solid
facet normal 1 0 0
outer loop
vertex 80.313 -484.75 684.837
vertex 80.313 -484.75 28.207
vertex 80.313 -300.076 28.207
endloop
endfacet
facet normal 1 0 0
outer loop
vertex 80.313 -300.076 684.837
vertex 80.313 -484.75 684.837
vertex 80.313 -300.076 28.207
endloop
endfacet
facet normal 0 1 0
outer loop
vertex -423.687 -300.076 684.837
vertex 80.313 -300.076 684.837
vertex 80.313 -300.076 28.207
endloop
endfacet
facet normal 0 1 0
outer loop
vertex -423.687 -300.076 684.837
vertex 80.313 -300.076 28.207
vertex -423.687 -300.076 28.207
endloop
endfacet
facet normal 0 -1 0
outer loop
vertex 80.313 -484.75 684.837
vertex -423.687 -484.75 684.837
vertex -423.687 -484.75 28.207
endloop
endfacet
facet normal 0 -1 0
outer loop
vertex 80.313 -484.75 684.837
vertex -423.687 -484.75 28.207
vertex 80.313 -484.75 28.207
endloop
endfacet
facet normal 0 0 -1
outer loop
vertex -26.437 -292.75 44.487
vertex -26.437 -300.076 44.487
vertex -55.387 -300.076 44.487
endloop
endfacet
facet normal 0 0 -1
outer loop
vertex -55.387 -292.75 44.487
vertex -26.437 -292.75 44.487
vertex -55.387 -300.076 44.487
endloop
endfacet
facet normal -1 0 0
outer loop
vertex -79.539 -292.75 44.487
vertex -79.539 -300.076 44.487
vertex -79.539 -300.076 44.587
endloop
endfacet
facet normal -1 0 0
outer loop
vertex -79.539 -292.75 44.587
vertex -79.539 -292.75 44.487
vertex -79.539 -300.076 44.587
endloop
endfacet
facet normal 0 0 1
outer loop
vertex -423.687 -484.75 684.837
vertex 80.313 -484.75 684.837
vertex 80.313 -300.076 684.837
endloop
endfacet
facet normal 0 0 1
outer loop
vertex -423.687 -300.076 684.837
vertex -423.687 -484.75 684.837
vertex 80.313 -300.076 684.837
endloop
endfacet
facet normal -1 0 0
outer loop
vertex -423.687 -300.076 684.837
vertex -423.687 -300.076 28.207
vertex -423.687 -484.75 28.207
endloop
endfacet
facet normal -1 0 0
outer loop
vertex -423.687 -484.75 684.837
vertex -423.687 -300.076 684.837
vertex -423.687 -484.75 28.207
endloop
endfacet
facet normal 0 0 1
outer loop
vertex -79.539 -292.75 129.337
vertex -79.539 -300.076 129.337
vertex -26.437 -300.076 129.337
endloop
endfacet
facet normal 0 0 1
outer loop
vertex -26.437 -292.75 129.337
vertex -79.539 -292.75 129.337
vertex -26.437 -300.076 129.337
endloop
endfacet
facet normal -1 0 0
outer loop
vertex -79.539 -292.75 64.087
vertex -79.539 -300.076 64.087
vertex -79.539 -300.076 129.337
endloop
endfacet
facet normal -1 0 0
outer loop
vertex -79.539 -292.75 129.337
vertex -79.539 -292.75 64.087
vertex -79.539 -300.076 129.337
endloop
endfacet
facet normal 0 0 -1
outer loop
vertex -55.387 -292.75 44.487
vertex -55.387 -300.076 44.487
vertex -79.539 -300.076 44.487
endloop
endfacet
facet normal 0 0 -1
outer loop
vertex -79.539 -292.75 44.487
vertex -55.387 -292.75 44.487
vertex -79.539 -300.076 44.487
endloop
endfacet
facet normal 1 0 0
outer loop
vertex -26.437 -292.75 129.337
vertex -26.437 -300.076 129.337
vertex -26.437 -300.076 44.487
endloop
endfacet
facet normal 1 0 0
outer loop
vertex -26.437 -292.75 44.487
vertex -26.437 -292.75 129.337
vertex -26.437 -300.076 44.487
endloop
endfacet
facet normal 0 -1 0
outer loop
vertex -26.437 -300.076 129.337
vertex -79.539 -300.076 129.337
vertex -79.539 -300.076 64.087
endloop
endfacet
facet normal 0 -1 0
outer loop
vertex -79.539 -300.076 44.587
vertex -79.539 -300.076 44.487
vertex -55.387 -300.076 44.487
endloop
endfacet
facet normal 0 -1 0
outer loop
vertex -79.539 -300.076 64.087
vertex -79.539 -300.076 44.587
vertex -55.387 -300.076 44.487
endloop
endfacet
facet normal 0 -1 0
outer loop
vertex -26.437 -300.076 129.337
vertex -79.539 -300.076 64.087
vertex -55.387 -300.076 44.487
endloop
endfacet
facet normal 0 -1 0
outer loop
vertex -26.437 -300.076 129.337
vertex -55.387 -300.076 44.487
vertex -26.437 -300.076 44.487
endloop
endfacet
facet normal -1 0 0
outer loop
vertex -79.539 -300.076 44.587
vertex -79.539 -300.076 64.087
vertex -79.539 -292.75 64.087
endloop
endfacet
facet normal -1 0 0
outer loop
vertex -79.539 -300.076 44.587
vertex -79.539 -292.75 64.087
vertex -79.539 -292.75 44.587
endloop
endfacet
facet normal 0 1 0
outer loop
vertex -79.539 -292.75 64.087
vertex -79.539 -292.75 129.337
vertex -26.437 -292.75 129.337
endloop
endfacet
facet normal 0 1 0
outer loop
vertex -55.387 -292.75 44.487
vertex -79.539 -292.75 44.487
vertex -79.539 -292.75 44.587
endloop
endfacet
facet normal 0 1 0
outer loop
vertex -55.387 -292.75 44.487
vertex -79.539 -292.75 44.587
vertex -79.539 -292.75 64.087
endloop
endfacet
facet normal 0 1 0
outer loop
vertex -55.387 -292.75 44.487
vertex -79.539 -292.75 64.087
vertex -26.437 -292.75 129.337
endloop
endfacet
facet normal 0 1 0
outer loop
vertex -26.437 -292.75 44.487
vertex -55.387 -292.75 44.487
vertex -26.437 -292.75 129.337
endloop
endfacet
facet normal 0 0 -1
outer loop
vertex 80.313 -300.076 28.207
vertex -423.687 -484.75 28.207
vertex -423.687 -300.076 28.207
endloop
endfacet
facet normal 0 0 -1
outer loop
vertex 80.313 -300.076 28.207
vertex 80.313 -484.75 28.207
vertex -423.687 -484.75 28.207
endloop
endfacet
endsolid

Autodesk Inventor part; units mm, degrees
ref_plane "Work Plane1" through (-416.1869, -470.7505, 28.2071) normal (0, 0, -1) x (0, 1, 0)
sketch "Sketch1" plane through (-416.1869, -470.7505, 28.2071) normal (0, 0, -1) x (0, 1, 0)
  line L0 (-5.675, 491.5) -> (-5.675, 423.5) construction
  line L1 (170.675, 423.5) -> (170.675, 491.5) construction
  line L2 (166, -7.5) -> (160.638, -7.5) construction
  line L3 (154.362, -7.5) -> (149, -7.5) construction
  line L4 (16, -7.5) -> (10.638, -7.5) construction
  line L5 (4.362, -7.5) -> (-1, -7.5) construction
  line L6 (94.0505, 496.5) -> (100.0959, 496.5) construction
  line L7 (101.0959, 496.5) -> (107.1414, 496.5) construction
  line L8 (108.1414, 496.5) -> (114.1868, 496.5) construction
  line L9 (-13.9999, 496.5) -> (170.675, 496.5)
  line L10 (170.675, 496.5) -> (170.675, -7.5)
  line L11 (170.675, -7.5) -> (-13.9999, -7.5)
  line L12 (-13.9999, -7.5) -> (-13.9999, 496.5)
  line L13 (-13.69, 71.5) -> (-13.69, 253.5) construction
  line L14 (-13.9999, 266.9308) -> (-13.9999, 290.6308) construction
  point P0 (470.7505, 416.1869)
ref_plane "Work Plane2" through (60.3131, -476.4255, 684.8371) normal (0, 0, 1) x (1, 0, 0)
extrude "Extrusion1" add sketch "Sketch1" against normal up to surface (656.63 mm away)
sketch "Sketch2" plane through (-423.6869, -300.0755, 28.2071) normal (0, 1, 0) x (1, 0, 0)
  line L0 (397.25, -16.28) -> (344.1479, -16.28)
  line L1 (344.1479, -16.28) -> (344.1479, -101.13)
  line L2 (344.1479, -101.13) -> (397.25, -101.13)
  line L3 (397.25, -101.13) -> (397.25, -16.28)
  line L4 (344.1479, -35.88) -> (344.1479, -16.38) projected
  arc A0 (397.2117, -88.1724) -> (397.052, -86.959) centre (385.25, -89.13) ccw projected
  line L5 (343.1, -16.28) -> (368.3, -16.28) projected
  point P0 (423.6869, 28.2071)
ref_plane "Work Plane3" through (-49.4369, -292.7505, 106.3371) normal (0, 1, 0) x (0, 0, 1)
extrude "Extrusion2" add sketch "Sketch2" along normal up to surface (7.325 mm away) separate body
ref_plane "Work Plane4" through (50.3442, -329.0906, 827.6498) normal (0, 0, 1) x (1, 0, 0)
sketch "Sketch4" plane through (-423.6869, -484.7505, 684.8371) normal (0, 0, 1) x (1, 0, 0)
  line L0 (484, 161.1598) -> (484, 161.1598) projected
  line L1 (484, 153.6598) -> (484, 153.6598) projected
  line L2 (504, 157.4099) -> (478, 157.4099)
  line L3 (504, 184.6749) -> (504, 157.4099)
  line L4 (504, 0) -> (0, 0) construction
  line L5 (504, 184.6749) -> (504, 0) construction
  line L6 (0, 184.6749) -> (504, 184.6749) construction
  line L7 (0, 0) -> (0, 184.6749) construction
  line L8 (478, 157.4099) -> (453, 157.4099)
  line L9 (453, 157.4099) -> (423, 157.4099) construction
  line L10 (453, 282.4099) -> (423, 282.4099)
  line L11 (423, 32.4099) -> (453, 32.4099)
  arc A0 (453, 32.4099) -> (453, 282.4099) centre (453, 157.4099) ccw
  arc A1 (423, 282.4099) -> (423, 32.4099) centre (423, 157.4099) ccw
  point P0 (423.6869, 484.7505)
  point P1 (438, 157.4099)
  dimension "d5" = 27.265
  dimension "d6" = 26
  dimension "d7" = 25
  dimension "d9" = 30
  dimension "d10" = 250
sketch "Sketch6" plane through (-423.6869, -300.0755, 28.2071) normal (0, 1, 0) x (1, 0, 0)
  line L0 (0, 0) -> (0, -656.63) projected
  line L1 (96.005, -527.63) -> (96.005, -227.63) projected
  line L2 (85.43, -212.63) -> (82.255, -212.63) projected
  line L3 (97.505, -212.63) -> (97.505, -234.63) projected
  line L4 (85.43, -212.63) -> (90.255, -212.63) projected
  line L5 (97.505, -520.63) -> (97.505, -542.63) projected
  line L6 (82.255, -542.63) -> (85.43, -542.63) projected
  line L7 (96.005, -212.63) -> (0, -212.63)
  line L8 (0, -212.63) -> (0, -542.63)
  line L9 (0, -542.63) -> (96.005, -542.63)
  line L10 (96.005, -542.63) -> (96.005, -212.63)
  line L11 (96.005, -212.63) -> (99.2801, -212.63) construction
  line L12 (85.43, -542.63) -> (97.505, -542.63)
  point P0 (423.6869, 28.2071)
ref_plane "Work Plane14" through (-416.1869, -470.7505, 356.5221) normal (0, 0, -1) x (-1, 0, 0)
ref_plane "Work Plane15" through (-171.6869, -484.7505, 28.2071) normal (-1, 0, 0) x (0, 0, 1)
ref_plane "Work Plane17" through (-79.539, -388.7505, 44.4871) normal (0, 1, 0) x (1, 0, 0)
properties part number "TAZ 6 Convex Model"
